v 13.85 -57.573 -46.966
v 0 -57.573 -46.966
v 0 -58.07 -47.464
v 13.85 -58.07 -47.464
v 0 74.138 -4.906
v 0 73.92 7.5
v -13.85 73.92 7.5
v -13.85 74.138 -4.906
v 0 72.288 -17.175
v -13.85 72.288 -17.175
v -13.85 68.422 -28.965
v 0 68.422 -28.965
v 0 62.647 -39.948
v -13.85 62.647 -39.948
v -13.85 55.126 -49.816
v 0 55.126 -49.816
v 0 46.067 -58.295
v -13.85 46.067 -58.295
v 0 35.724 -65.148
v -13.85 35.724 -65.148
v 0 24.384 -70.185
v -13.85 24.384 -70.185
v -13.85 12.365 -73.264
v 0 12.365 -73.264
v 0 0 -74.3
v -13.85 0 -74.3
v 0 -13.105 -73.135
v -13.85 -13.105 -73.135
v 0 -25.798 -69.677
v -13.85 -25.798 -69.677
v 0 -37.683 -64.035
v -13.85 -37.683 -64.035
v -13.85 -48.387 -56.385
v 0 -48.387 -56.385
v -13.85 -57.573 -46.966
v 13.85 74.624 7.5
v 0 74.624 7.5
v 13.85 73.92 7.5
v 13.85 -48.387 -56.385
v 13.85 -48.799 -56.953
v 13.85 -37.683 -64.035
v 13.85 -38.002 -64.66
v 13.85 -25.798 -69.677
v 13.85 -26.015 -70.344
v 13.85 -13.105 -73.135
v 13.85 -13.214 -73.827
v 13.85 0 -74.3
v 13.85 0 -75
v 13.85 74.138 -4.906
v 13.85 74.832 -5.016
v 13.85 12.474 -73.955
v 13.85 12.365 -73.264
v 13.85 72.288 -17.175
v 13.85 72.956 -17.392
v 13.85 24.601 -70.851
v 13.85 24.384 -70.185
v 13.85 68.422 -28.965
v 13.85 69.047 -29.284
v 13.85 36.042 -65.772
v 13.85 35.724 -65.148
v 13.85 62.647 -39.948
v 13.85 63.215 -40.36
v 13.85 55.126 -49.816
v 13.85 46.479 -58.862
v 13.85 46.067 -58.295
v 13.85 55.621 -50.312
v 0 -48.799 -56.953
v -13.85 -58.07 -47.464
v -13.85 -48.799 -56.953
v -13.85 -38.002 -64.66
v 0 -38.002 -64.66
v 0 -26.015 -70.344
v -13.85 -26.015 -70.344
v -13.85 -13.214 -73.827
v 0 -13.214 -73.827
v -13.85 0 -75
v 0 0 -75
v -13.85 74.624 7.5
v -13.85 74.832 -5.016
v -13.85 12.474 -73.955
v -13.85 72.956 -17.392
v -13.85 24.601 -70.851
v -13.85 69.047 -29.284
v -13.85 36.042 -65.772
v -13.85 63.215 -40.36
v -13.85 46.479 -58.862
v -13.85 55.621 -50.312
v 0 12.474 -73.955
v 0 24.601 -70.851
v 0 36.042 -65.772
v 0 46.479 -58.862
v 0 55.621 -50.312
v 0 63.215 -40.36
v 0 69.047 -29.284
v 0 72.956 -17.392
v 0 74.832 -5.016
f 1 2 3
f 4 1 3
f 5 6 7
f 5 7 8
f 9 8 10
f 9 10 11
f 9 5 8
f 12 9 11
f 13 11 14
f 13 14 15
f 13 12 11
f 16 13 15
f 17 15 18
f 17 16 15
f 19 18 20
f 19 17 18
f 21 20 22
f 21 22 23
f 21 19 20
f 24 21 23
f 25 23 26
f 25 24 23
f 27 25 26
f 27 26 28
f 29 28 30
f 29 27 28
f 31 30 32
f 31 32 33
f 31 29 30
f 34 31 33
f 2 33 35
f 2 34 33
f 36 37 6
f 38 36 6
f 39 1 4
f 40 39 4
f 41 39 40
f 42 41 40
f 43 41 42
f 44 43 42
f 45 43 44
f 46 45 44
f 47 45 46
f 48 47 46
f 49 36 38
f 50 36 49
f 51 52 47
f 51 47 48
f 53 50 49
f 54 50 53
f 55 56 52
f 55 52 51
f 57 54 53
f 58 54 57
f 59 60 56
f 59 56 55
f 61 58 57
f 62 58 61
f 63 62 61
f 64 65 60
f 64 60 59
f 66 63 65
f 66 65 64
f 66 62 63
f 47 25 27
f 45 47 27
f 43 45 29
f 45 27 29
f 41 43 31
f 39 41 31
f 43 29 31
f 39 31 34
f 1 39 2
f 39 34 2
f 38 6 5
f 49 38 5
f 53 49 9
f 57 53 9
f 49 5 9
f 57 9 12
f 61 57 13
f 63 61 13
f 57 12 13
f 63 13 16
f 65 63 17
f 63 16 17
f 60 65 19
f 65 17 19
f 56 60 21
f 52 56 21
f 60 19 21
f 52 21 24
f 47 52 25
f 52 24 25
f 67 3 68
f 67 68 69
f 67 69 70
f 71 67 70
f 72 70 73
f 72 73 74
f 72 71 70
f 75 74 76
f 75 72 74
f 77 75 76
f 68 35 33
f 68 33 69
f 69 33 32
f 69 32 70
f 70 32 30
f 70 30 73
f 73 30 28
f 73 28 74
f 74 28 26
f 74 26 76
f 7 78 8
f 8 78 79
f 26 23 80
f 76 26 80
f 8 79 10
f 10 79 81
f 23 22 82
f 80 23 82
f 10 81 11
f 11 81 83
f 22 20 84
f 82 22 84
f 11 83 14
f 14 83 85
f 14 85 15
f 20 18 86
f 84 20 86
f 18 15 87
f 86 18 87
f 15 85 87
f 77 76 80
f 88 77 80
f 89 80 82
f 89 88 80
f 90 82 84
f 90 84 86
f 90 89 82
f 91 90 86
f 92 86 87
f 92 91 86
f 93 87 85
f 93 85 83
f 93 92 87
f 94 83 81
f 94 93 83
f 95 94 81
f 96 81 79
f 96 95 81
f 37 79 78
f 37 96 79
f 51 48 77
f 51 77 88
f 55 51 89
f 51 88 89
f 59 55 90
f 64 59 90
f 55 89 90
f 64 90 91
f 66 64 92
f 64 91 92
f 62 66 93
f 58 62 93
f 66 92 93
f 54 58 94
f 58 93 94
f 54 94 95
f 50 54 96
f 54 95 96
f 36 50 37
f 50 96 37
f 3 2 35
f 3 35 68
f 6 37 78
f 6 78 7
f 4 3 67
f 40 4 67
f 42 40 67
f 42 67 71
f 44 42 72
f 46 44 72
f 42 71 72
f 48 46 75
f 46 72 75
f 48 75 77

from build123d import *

# Parameters (mm, degrees)
BOSS_EXTRUDE1_DEPTH = 13.85


with BuildPart() as part:
    # Sketch1 → Boss-Extrude1 (new, symmetric)
    with BuildSketch(Plane(origin=(0, 0, 0), x_dir=(0, 0, -1), z_dir=(1, 0, 0))):
        with BuildLine():
            ThreePointArc((74.3, 0), (67.119640803, -31.866029224), (46.966384428, -57.572986146))
            Line((46.966384428, -57.572986146), (47.463876439, -58.070478157))
            ThreePointArc((47.463876439, -58.070478157), (67.76721454, -32.13416614), (75, 0))
            ThreePointArc((75, 0), (50.311529494, 55.621488653), (-7.5, 74.624057783))
            Line((-7.5, 74.624057783), (-7.5, 73.920497834))
            ThreePointArc((-7.5, 73.920497834), (49.815860928, 55.125946704), (74.3, 0))
        make_face()
    extrude(amount=BOSS_EXTRUDE1_DEPTH, both=True)


solid = part.part
